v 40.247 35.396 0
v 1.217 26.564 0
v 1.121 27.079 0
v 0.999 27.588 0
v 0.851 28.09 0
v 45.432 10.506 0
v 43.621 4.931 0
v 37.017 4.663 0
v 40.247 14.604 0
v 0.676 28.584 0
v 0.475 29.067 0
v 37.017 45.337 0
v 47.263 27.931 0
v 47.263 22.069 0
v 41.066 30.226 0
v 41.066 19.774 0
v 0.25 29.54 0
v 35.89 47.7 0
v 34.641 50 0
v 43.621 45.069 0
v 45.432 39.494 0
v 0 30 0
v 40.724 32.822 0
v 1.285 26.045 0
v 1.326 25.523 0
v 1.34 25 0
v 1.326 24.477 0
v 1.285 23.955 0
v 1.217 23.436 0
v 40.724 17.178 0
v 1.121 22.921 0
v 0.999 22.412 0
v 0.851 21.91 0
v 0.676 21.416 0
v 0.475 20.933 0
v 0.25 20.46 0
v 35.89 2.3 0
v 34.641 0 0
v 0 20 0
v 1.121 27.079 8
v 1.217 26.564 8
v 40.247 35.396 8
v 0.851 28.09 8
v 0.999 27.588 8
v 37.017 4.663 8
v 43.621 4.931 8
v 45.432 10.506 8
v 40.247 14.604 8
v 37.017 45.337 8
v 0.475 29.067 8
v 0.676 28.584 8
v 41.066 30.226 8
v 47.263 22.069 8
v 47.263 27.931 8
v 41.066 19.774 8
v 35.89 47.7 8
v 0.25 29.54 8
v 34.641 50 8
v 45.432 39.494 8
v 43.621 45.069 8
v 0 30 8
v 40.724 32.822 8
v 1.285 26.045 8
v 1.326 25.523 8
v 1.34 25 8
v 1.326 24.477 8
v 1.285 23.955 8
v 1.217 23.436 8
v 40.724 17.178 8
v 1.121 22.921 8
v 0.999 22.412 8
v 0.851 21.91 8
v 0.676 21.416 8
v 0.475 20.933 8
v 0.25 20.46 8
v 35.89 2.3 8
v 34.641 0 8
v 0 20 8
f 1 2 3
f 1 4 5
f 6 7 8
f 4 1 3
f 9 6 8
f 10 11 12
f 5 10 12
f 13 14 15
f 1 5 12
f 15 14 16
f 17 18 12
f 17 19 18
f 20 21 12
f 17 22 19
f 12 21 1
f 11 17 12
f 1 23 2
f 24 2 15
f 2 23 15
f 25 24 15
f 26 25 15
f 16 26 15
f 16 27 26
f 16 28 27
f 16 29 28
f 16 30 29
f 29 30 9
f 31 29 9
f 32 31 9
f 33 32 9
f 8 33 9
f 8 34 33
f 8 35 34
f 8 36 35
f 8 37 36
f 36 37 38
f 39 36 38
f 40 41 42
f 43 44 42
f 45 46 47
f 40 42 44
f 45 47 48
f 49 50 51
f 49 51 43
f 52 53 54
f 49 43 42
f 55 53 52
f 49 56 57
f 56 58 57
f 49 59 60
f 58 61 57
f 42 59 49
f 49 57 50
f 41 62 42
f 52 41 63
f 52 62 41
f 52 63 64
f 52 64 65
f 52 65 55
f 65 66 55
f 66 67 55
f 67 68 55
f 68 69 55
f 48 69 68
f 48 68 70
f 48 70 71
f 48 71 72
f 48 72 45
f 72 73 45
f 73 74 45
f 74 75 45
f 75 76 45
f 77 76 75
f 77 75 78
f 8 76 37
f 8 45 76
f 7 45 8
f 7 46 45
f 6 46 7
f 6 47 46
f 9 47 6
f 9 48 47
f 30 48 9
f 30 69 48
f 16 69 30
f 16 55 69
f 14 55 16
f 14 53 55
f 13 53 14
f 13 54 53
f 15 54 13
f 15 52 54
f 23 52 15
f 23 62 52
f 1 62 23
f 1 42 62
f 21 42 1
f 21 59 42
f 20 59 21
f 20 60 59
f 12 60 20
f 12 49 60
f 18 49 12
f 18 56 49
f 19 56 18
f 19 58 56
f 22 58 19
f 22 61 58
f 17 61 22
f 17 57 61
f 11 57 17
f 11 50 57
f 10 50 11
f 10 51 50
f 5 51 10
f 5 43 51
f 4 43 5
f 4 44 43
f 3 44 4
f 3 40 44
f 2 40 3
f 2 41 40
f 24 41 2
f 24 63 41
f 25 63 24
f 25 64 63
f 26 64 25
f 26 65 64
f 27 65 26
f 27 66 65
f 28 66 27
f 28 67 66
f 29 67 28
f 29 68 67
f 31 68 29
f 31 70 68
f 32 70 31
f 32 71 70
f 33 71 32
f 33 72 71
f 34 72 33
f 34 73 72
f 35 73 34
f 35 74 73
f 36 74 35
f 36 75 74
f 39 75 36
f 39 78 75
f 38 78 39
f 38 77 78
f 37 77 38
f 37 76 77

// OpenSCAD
$fn = 32;

// ----------------------------------------------------------------------
// Gear sector: 3 teeth on 60 degrees
// ----------------------------------------------------------------------

// --- parameters (mm) ---
sector_angle = 60;        // sector angle, degrees
root_r = 50;              // root circle radius
tooth_h = 6;              // tooth height over the root circle
teeth = 3;                // number of teeth on the sector
hub_r = 10;               // hub bore radius
plate_t = 8;              // sector thickness, Z
arc_step = 3;             // sampling step of the root/hub arcs, degrees

tip_r = root_r + tooth_h;  // tip circle radius

profile = [[34.641, 0], [35.89, 2.3], [37.017, 4.663], [43.621, 4.931], [45.432, 10.506], [40.247, 14.604], [40.724, 17.178], [41.066, 19.774], [47.263, 22.069], [47.263, 27.931], [41.066, 30.226], [40.724, 32.822], [40.247, 35.396], [45.432, 39.494], [43.621, 45.069], [37.017, 45.337], [35.89, 47.7], [34.641, 50], [0, 30], [0.25, 29.54], [0.475, 29.067], [0.676, 28.584], [0.851, 28.09], [0.999, 27.588], [1.121, 27.079], [1.217, 26.564], [1.285, 26.045], [1.326, 25.523], [1.34, 25], [1.326, 24.477], [1.285, 23.955], [1.217, 23.436], [1.121, 22.921], [0.999, 22.412], [0.851, 21.91], [0.676, 21.416], [0.475, 20.933], [0.25, 20.46], [0, 20]];  // primary outline, 39 points, counter clockwise

// --- the one profile operation ---
linear_extrude(height = plate_t) polygon(points = profile);
